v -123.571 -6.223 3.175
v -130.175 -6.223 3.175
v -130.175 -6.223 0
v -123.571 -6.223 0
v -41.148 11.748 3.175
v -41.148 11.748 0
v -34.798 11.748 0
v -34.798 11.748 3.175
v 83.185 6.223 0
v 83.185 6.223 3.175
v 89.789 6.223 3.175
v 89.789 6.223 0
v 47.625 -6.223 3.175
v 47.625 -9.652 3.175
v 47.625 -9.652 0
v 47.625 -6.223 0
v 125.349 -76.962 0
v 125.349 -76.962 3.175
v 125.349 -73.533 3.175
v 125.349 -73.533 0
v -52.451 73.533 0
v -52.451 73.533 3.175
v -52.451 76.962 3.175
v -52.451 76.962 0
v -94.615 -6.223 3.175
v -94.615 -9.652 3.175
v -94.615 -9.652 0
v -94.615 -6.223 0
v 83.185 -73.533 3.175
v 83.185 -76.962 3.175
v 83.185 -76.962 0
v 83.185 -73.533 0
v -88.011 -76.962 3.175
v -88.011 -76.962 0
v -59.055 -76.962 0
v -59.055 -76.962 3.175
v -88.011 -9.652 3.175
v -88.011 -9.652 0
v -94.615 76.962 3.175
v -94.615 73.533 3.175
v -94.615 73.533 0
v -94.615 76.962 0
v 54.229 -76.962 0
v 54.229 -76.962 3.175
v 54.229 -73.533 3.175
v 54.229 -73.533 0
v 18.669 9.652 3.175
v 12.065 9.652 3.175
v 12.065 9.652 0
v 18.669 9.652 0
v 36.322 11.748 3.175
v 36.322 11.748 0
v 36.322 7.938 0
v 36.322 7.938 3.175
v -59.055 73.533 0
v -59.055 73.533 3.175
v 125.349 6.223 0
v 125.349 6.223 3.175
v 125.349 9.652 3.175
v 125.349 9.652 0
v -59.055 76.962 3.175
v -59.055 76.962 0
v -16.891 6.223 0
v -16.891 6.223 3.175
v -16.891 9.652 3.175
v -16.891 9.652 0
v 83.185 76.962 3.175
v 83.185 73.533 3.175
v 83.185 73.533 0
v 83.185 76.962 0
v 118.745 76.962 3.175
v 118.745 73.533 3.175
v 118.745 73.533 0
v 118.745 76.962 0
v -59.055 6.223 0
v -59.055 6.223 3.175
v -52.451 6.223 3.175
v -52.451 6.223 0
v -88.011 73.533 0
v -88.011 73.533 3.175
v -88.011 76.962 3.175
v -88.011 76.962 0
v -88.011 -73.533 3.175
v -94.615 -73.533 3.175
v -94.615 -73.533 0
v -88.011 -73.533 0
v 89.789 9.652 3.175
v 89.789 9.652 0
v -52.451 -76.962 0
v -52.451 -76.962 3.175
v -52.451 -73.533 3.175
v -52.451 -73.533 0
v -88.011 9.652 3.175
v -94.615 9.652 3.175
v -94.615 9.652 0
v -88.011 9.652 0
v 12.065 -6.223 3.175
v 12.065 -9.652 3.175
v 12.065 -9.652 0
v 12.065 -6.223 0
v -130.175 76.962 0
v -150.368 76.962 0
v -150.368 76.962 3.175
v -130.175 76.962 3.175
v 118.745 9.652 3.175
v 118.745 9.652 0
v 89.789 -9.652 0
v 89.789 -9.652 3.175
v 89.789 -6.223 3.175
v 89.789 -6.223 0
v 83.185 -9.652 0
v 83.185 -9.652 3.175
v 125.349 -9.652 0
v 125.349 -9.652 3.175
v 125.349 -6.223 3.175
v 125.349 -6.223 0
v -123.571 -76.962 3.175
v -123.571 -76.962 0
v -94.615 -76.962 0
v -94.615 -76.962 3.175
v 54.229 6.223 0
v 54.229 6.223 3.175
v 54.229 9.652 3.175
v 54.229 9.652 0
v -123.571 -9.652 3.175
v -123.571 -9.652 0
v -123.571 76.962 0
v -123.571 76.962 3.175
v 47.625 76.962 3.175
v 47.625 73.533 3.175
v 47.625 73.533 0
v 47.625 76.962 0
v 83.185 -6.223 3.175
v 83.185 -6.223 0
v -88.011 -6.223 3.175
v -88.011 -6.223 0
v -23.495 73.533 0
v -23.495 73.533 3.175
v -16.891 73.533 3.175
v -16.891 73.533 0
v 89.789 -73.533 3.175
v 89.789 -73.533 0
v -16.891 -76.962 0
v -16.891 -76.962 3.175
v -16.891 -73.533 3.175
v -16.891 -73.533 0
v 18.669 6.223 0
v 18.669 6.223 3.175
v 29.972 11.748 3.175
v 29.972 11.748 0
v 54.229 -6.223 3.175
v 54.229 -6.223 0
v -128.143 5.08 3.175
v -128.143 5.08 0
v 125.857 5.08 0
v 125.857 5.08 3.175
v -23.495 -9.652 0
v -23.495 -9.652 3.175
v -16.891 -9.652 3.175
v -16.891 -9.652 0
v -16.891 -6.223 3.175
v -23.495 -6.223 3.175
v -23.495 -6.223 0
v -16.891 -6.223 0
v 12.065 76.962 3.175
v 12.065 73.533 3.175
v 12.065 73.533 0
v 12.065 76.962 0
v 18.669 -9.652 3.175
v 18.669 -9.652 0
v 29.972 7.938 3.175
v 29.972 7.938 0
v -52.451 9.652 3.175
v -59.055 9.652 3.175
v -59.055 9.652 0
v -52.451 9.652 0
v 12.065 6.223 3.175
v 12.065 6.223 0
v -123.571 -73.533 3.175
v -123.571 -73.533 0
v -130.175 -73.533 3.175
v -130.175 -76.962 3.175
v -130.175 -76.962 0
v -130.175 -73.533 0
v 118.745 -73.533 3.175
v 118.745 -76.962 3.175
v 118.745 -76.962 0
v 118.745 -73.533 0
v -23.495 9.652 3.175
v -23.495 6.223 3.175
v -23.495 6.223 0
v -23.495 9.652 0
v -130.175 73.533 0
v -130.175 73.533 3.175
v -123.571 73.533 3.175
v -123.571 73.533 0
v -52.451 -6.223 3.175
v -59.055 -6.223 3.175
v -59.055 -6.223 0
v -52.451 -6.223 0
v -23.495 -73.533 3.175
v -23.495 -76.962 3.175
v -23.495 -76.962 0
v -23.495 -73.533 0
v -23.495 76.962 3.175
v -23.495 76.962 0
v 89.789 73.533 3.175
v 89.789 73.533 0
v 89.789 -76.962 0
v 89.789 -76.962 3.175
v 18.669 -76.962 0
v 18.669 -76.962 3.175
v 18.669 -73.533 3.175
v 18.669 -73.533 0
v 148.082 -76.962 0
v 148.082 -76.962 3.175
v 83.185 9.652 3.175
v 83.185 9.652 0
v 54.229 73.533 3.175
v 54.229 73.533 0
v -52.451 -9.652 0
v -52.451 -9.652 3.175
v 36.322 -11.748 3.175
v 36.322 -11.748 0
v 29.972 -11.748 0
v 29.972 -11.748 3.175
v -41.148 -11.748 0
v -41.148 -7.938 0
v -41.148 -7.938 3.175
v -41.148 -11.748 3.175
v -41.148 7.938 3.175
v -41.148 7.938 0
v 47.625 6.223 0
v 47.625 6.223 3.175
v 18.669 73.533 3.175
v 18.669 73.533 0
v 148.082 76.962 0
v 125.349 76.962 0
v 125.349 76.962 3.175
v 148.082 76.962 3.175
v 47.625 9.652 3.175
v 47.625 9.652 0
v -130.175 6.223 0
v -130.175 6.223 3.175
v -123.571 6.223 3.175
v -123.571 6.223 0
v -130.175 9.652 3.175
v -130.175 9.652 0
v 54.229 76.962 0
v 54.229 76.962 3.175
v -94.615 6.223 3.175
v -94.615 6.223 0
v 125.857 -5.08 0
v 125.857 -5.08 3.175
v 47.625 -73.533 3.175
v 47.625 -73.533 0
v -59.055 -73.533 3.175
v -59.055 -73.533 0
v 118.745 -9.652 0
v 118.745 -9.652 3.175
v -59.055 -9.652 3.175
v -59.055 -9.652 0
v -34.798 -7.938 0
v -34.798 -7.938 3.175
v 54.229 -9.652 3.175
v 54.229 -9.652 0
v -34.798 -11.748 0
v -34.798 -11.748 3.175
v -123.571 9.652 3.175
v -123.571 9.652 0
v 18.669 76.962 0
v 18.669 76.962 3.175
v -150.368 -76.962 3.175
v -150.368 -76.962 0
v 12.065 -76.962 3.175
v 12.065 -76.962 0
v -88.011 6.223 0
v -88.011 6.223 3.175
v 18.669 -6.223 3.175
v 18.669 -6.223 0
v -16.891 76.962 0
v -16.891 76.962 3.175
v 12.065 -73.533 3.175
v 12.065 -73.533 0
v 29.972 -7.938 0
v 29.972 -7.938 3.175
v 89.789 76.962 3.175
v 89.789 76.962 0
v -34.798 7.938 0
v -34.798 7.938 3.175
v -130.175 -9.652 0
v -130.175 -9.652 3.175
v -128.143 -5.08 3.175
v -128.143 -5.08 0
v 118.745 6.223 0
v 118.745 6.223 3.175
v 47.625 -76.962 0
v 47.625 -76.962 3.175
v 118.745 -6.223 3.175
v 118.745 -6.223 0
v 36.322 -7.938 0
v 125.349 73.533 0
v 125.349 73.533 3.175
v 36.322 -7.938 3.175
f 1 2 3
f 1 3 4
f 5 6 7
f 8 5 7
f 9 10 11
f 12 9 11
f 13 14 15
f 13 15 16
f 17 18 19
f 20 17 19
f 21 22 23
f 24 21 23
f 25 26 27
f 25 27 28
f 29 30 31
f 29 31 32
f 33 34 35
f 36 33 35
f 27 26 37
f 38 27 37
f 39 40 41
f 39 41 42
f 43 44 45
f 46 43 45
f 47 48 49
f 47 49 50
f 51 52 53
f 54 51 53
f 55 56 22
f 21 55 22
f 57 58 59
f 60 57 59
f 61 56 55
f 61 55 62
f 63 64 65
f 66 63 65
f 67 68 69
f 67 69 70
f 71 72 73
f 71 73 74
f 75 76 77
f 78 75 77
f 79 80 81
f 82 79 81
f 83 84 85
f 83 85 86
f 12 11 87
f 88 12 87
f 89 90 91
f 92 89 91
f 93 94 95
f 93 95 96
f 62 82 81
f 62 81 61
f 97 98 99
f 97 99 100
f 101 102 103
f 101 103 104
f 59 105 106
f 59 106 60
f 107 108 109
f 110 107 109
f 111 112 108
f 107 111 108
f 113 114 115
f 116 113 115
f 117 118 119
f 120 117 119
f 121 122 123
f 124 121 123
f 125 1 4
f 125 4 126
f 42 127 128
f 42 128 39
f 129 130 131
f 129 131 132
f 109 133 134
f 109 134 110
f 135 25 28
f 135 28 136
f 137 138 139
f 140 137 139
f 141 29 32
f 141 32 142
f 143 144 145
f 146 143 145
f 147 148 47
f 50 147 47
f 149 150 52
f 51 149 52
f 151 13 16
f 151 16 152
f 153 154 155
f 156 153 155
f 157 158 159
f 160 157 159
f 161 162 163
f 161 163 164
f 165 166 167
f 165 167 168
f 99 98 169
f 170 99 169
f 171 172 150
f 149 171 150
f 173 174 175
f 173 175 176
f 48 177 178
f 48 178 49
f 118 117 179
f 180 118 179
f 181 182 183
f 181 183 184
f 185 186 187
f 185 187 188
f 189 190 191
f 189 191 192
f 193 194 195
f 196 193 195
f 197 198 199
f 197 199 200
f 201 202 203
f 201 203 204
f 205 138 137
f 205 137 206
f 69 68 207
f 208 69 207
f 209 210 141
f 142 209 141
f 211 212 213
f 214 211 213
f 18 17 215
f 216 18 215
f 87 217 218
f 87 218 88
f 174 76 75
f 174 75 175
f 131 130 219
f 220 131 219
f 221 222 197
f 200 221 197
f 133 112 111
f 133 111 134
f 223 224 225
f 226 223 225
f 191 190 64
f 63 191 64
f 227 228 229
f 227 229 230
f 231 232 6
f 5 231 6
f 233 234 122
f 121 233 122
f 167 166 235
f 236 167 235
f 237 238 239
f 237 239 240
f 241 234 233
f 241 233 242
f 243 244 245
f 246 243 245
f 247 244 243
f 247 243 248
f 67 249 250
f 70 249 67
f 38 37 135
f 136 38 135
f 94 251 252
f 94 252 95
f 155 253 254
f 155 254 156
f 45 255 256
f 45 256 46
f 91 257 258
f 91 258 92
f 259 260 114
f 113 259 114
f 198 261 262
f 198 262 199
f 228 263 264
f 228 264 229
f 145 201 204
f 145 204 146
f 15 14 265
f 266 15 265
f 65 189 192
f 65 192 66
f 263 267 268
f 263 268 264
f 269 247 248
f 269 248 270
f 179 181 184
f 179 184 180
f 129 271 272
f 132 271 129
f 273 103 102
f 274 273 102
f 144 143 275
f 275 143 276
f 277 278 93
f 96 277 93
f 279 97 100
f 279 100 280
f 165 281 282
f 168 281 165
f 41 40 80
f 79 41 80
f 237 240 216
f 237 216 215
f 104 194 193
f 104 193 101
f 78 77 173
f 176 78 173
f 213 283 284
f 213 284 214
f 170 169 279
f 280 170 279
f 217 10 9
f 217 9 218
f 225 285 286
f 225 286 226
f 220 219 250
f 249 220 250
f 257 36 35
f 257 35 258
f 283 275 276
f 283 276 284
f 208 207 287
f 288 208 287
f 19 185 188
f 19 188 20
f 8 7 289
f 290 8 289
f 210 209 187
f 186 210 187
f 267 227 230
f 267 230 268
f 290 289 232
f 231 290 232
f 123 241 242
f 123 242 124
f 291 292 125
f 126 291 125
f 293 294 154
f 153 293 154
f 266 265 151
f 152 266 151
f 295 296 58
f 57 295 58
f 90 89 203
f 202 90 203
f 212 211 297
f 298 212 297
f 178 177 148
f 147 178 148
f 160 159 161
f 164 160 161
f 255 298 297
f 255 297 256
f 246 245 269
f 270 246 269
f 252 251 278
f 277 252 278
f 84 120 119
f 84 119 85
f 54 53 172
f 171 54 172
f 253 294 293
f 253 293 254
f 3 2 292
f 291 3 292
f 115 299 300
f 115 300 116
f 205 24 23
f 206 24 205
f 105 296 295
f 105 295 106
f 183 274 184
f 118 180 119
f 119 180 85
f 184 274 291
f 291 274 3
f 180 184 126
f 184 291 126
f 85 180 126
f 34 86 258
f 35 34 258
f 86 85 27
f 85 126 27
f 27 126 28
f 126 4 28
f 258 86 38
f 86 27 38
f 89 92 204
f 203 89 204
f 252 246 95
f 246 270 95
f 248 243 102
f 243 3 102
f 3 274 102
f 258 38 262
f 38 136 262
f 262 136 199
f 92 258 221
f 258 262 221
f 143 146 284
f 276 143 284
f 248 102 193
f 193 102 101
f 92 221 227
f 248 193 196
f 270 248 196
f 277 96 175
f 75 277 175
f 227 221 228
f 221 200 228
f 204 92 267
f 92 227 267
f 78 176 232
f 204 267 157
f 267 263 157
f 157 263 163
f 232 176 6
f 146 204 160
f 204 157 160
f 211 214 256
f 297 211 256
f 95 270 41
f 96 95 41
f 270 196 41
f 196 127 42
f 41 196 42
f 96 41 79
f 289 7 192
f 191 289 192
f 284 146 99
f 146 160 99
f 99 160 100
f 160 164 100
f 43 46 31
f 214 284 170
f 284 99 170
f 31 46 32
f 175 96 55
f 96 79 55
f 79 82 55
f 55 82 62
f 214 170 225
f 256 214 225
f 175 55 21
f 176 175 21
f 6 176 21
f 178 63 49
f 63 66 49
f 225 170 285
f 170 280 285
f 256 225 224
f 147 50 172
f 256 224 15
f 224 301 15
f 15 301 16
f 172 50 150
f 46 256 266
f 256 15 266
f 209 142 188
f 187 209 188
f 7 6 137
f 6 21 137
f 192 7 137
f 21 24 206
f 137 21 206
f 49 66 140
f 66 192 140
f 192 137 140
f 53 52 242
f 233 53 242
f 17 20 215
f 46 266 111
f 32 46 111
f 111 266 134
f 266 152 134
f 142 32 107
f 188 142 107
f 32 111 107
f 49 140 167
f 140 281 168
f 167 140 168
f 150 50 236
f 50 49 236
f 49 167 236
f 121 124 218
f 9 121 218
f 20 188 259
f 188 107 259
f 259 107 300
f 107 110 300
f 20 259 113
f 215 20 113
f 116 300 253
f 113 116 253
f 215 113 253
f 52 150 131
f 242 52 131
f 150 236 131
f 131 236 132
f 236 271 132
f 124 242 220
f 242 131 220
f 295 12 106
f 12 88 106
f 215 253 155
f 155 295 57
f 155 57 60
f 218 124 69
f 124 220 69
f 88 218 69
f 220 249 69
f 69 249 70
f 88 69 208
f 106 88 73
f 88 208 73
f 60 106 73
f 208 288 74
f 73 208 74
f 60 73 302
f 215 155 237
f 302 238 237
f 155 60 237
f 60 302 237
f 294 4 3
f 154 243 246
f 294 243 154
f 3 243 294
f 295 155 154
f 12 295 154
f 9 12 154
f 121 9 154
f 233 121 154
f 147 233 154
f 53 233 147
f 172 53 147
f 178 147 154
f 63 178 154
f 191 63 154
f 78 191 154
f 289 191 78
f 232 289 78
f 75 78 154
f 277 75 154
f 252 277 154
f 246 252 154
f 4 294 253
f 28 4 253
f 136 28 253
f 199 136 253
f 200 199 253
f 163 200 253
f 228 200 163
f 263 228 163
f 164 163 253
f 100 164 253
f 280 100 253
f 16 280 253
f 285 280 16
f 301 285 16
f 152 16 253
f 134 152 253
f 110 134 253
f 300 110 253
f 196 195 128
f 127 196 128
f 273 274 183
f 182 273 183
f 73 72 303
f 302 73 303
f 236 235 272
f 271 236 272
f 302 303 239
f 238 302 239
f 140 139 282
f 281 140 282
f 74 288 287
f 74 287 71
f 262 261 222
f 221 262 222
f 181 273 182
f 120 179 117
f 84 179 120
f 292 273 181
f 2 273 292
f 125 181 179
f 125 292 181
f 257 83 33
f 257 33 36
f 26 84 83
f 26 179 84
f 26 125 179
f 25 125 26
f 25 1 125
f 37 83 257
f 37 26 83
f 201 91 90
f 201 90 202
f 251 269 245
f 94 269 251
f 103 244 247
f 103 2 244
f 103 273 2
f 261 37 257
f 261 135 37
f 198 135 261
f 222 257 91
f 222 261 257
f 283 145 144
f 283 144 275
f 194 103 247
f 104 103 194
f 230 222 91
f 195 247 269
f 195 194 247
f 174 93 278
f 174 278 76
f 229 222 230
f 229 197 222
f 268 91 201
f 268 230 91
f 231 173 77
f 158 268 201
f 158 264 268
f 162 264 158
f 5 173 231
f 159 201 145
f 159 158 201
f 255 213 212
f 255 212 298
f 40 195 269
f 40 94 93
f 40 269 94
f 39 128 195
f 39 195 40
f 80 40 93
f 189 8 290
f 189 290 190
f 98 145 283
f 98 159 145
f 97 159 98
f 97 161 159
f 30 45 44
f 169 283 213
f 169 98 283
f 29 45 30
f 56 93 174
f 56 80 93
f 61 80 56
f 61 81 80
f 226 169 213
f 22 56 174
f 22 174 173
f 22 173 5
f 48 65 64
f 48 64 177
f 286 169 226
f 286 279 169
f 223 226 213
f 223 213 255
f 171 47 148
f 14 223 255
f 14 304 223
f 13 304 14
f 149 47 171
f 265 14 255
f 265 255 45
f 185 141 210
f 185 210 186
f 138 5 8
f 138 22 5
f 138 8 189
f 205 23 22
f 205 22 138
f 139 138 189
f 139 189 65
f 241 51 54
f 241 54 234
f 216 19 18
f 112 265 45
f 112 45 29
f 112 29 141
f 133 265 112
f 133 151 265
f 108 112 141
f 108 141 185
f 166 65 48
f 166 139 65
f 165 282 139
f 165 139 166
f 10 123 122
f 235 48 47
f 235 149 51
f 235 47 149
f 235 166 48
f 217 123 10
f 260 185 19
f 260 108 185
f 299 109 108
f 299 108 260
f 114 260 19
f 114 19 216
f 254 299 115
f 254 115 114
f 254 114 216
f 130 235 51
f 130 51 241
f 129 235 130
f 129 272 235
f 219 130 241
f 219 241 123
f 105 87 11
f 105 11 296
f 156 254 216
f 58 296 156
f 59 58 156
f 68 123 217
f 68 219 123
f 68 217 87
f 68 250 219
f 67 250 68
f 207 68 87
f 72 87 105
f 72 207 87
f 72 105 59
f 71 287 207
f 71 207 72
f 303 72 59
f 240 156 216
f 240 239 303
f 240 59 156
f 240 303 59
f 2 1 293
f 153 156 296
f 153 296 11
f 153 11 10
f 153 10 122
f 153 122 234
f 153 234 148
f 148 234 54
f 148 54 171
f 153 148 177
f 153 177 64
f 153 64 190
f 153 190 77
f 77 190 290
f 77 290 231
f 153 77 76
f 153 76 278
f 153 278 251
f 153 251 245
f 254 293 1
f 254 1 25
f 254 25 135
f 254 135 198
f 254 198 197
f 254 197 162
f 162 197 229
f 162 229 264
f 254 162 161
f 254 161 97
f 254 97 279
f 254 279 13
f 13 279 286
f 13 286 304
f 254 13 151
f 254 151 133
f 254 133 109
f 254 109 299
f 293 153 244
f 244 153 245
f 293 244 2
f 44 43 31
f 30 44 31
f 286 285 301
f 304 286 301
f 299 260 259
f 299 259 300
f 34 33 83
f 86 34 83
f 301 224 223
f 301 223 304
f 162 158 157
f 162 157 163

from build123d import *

# Parameters (mm, degrees)
SKETCH4_W                = 298.45
SKETCH4_H                = 38.1
SKETCH4_W_2              = 254
SKETCH4_H_2              = 10.16
BOSS_EXTRUDE1_DEPTH      = 3.175
SKETCH5_W                = 6.604
SKETCH5_H                = 3.429
CUT_EXTRUDE1_DEPTH       = 152.603161408
SKETCH7_W                = 298.45
SKETCH7_H                = 3.175
BOSS_EXTRUDE2_DEPTH      = 57.912
LPATTERN3_COUNT          = 2
LPATTERN3_PITCH          = 67.31
LPATTERN3_COUNT_DIR2     = 8
LPATTERN3_PITCH_DIR2     = 35.56
CUT_EXTRUDE2_DEPTH       = 169.94900264
LPATTERN2_COUNT          = 2
LPATTERN2_PITCH          = 71.12
MIRROR1_COPY_1_SKETCH_W  = 6.604
MIRROR1_COPY_1_SKETCH_H  = 3.429
MIRROR1_COPY_1_DEPTH     = 152.603161408
MIRROR1_COPY_2_SKETCH_W  = 6.604
MIRROR1_COPY_2_SKETCH_H  = 3.429
MIRROR1_COPY_2_DEPTH     = 152.603161408
MIRROR1_COPY_3_SKETCH_W  = 6.604
MIRROR1_COPY_3_SKETCH_H  = 3.429
MIRROR1_COPY_3_DEPTH     = 152.603161408
MIRROR1_COPY_4_SKETCH_W  = 6.604
MIRROR1_COPY_4_SKETCH_H  = 3.429
MIRROR1_COPY_4_DEPTH     = 152.603161408
MIRROR1_COPY_5_SKETCH_W  = 6.604
MIRROR1_COPY_5_SKETCH_H  = 3.429
MIRROR1_COPY_5_DEPTH     = 152.603161408
MIRROR1_COPY_6_SKETCH_W  = 6.604
MIRROR1_COPY_6_SKETCH_H  = 3.429
MIRROR1_COPY_6_DEPTH     = 152.603161408
MIRROR1_COPY_7_SKETCH_W  = 6.604
MIRROR1_COPY_7_SKETCH_H  = 3.429
MIRROR1_COPY_7_DEPTH     = 152.603161408
MIRROR1_COPY_8_SKETCH_W  = 6.604
MIRROR1_COPY_8_SKETCH_H  = 3.429
MIRROR1_COPY_8_DEPTH     = 152.603161408
MIRROR1_COPY_9_SKETCH_W  = 6.604
MIRROR1_COPY_9_SKETCH_H  = 3.429
MIRROR1_COPY_9_DEPTH     = 152.603161408
MIRROR1_COPY_10_SKETCH_W = 6.604
MIRROR1_COPY_10_SKETCH_H = 3.429
MIRROR1_COPY_10_DEPTH    = 152.603161408
MIRROR1_COPY_11_SKETCH_W = 6.604
MIRROR1_COPY_11_SKETCH_H = 3.429
MIRROR1_COPY_11_DEPTH    = 152.603161408
MIRROR1_COPY_12_SKETCH_W = 6.604
MIRROR1_COPY_12_SKETCH_H = 3.429
MIRROR1_COPY_12_DEPTH    = 152.603161408
MIRROR1_COPY_13_SKETCH_W = 6.604
MIRROR1_COPY_13_SKETCH_H = 3.429
MIRROR1_COPY_13_DEPTH    = 152.603161408
MIRROR1_COPY_14_SKETCH_W = 6.604
MIRROR1_COPY_14_SKETCH_H = 3.429
MIRROR1_COPY_14_DEPTH    = 152.603161408
MIRROR1_COPY_15_SKETCH_W = 6.604
MIRROR1_COPY_15_SKETCH_H = 3.429
MIRROR1_COPY_15_DEPTH    = 152.603161408
MIRROR1_COPY_16_DEPTH    = 169.94900264


with BuildPart() as part:
    # Sketch4 → Boss-Extrude1 (new body)
    with BuildSketch(Plane.XY):
        with Locations((-1.143, 0)):
            Rectangle(SKETCH4_W, SKETCH4_H)
        with Locations((-1.143, 0)):
            Rectangle(SKETCH4_W_2, SKETCH4_H_2, mode=Mode.SUBTRACT)
    extrude(amount=BOSS_EXTRUDE1_DEPTH)

    # Sketch5 → Cut-Extrude1 (cut, through all)
    with BuildSketch(Plane.XY.offset(3.175)):
        with Locations((-126.873, 7.9375)):
            Rectangle(SKETCH5_W, SKETCH5_H)
    cut_extrude1 = extrude(amount=-CUT_EXTRUDE1_DEPTH, mode=Mode.SUBTRACT)

    # Sketch7 → Boss-Extrude2 (add)
    with BuildSketch(Plane(origin=(0, 19.05, 0), x_dir=(1, 0, 0), z_dir=(0, 1, 0))):
        with Locations((-1.143, -1.5875)):
            Rectangle(SKETCH7_W, SKETCH7_H)
    boss_extrude2 = extrude(amount=BOSS_EXTRUDE2_DEPTH)

    # LPattern3: Cut-Extrude1 2 × 8
    with Locations(*[(j * LPATTERN3_PITCH_DIR2, i * LPATTERN3_PITCH, 0) for i in range(LPATTERN3_COUNT) for j in range(LPATTERN3_COUNT_DIR2) if (i, j) != (0, 0)]):
        add(cut_extrude1, mode=Mode.SUBTRACT)

    # Sketch6 → Cut-Extrude2 (cut, through all)
    with BuildSketch(Plane(origin=(0, 0, 0), x_dir=(-1, 0, 0), z_dir=(0, 0, -1))):
        Polygon((37.973, 7.9375), (41.148, 7.9375), (41.148, 11.7475), (37.973, 11.7475), (34.798, 11.7475), (34.798, 7.9375), align=None)
    cut_extrude2 = extrude(amount=-CUT_EXTRUDE2_DEPTH, mode=Mode.SUBTRACT)

    # LPattern2: Cut-Extrude2 ×2
    with Locations(*[(i * LPATTERN2_PITCH, 0, 0) for i in range(1, LPATTERN2_COUNT)]):
        add(cut_extrude2, mode=Mode.SUBTRACT)

    # Mirror1: Cut-Extrude1, Boss-Extrude2, Cut-Extrude2 across plane
    add(cut_extrude1.mirror(Plane.ZX), mode=Mode.SUBTRACT)
    add(boss_extrude2.mirror(Plane.ZX))
    add(cut_extrude2.mirror(Plane.ZX), mode=Mode.SUBTRACT)

    # Mirror1 copy 1 sketch → Mirror1 copy 1 (cut, through all)
    with BuildSketch(Plane(origin=(35.56, 0, 3.175), x_dir=(1, 0, 0), z_dir=(0, 0, 1))):
        with Locations((-126.873, -7.9375)):
            Rectangle(MIRROR1_COPY_1_SKETCH_W, MIRROR1_COPY_1_SKETCH_H)
    extrude(amount=-MIRROR1_COPY_1_DEPTH, mode=Mode.SUBTRACT)

    # Mirror1 copy 2 sketch → Mirror1 copy 2 (cut, through all)
    with BuildSketch(Plane(origin=(71.12, 0, 3.175), x_dir=(1, 0, 0), z_dir=(0, 0, 1))):
        with Locations((-126.873, -7.9375)):
            Rectangle(MIRROR1_COPY_2_SKETCH_W, MIRROR1_COPY_2_SKETCH_H)
    extrude(amount=-MIRROR1_COPY_2_DEPTH, mode=Mode.SUBTRACT)

    # Mirror1 copy 3 sketch → Mirror1 copy 3 (cut, through all)
    with BuildSketch(Plane(origin=(106.68, 0, 3.175), x_dir=(1, 0, 0), z_dir=(0, 0, 1))):
        with Locations((-126.873, -7.9375)):
            Rectangle(MIRROR1_COPY_3_SKETCH_W, MIRROR1_COPY_3_SKETCH_H)
    extrude(amount=-MIRROR1_COPY_3_DEPTH, mode=Mode.SUBTRACT)

    # Mirror1 copy 4 sketch → Mirror1 copy 4 (cut, through all)
    with BuildSketch(Plane(origin=(142.24, 0, 3.175), x_dir=(1, 0, 0), z_dir=(0, 0, 1))):
        with Locations((-126.873, -7.9375)):
            Rectangle(MIRROR1_COPY_4_SKETCH_W, MIRROR1_COPY_4_SKETCH_H)
    extrude(amount=-MIRROR1_COPY_4_DEPTH, mode=Mode.SUBTRACT)

    # Mirror1 copy 5 sketch → Mirror1 copy 5 (cut, through all)
    with BuildSketch(Plane(origin=(177.8, 0, 3.175), x_dir=(1, 0, 0), z_dir=(0, 0, 1))):
        with Locations((-126.873, -7.9375)):
            Rectangle(MIRROR1_COPY_5_SKETCH_W, MIRROR1_COPY_5_SKETCH_H)
    extrude(amount=-MIRROR1_COPY_5_DEPTH, mode=Mode.SUBTRACT)

    # Mirror1 copy 6 sketch → Mirror1 copy 6 (cut, through all)
    with BuildSketch(Plane(origin=(213.36, 0, 3.175), x_dir=(1, 0, 0), z_dir=(0, 0, 1))):
        with Locations((-126.873, -7.9375)):
            Rectangle(MIRROR1_COPY_6_SKETCH_W, MIRROR1_COPY_6_SKETCH_H)
    extrude(amount=-MIRROR1_COPY_6_DEPTH, mode=Mode.SUBTRACT)

    # Mirror1 copy 7 sketch → Mirror1 copy 7 (cut, through all)
    with BuildSketch(Plane(origin=(248.92, 0, 3.175), x_dir=(1, 0, 0), z_dir=(0, 0, 1))):
        with Locations((-126.873, -7.9375)):
            Rectangle(MIRROR1_COPY_7_SKETCH_W, MIRROR1_COPY_7_SKETCH_H)
    extrude(amount=-MIRROR1_COPY_7_DEPTH, mode=Mode.SUBTRACT)

    # Mirror1 copy 8 sketch → Mirror1 copy 8 (cut, through all)
    with BuildSketch(Plane(origin=(0, -67.31, 3.175), x_dir=(1, 0, 0), z_dir=(0, 0, 1))):
        with Locations((-126.873, -7.9375)):
            Rectangle(MIRROR1_COPY_8_SKETCH_W, MIRROR1_COPY_8_SKETCH_H)
    extrude(amount=-MIRROR1_COPY_8_DEPTH, mode=Mode.SUBTRACT)

    # Mirror1 copy 9 sketch → Mirror1 copy 9 (cut, through all)
    with BuildSketch(Plane(origin=(35.56, -67.31, 3.175), x_dir=(1, 0, 0), z_dir=(0, 0, 1))):
        with Locations((-126.873, -7.9375)):
            Rectangle(MIRROR1_COPY_9_SKETCH_W, MIRROR1_COPY_9_SKETCH_H)
    extrude(amount=-MIRROR1_COPY_9_DEPTH, mode=Mode.SUBTRACT)

    # Mirror1 copy 10 sketch → Mirror1 copy 10 (cut, through all)
    with BuildSketch(Plane(origin=(71.12, -67.31, 3.175), x_dir=(1, 0, 0), z_dir=(0, 0, 1))):
        with Locations((-126.873, -7.9375)):
            Rectangle(MIRROR1_COPY_10_SKETCH_W, MIRROR1_COPY_10_SKETCH_H)
    extrude(amount=-MIRROR1_COPY_10_DEPTH, mode=Mode.SUBTRACT)

    # Mirror1 copy 11 sketch → Mirror1 copy 11 (cut, through all)
    with BuildSketch(Plane(origin=(106.68, -67.31, 3.175), x_dir=(1, 0, 0), z_dir=(0, 0, 1))):
        with Locations((-126.873, -7.9375)):
            Rectangle(MIRROR1_COPY_11_SKETCH_W, MIRROR1_COPY_11_SKETCH_H)
    extrude(amount=-MIRROR1_COPY_11_DEPTH, mode=Mode.SUBTRACT)

    # Mirror1 copy 12 sketch → Mirror1 copy 12 (cut, through all)
    with BuildSketch(Plane(origin=(142.24, -67.31, 3.175), x_dir=(1, 0, 0), z_dir=(0, 0, 1))):
        with Locations((-126.873, -7.9375)):
            Rectangle(MIRROR1_COPY_12_SKETCH_W, MIRROR1_COPY_12_SKETCH_H)
    extrude(amount=-MIRROR1_COPY_12_DEPTH, mode=Mode.SUBTRACT)

    # Mirror1 copy 13 sketch → Mirror1 copy 13 (cut, through all)
    with BuildSketch(Plane(origin=(177.8, -67.31, 3.175), x_dir=(1, 0, 0), z_dir=(0, 0, 1))):
        with Locations((-126.873, -7.9375)):
            Rectangle(MIRROR1_COPY_13_SKETCH_W, MIRROR1_COPY_13_SKETCH_H)
    extrude(amount=-MIRROR1_COPY_13_DEPTH, mode=Mode.SUBTRACT)

    # Mirror1 copy 14 sketch → Mirror1 copy 14 (cut, through all)
    with BuildSketch(Plane(origin=(213.36, -67.31, 3.175), x_dir=(1, 0, 0), z_dir=(0, 0, 1))):
        with Locations((-126.873, -7.9375)):
            Rectangle(MIRROR1_COPY_14_SKETCH_W, MIRROR1_COPY_14_SKETCH_H)
    extrude(amount=-MIRROR1_COPY_14_DEPTH, mode=Mode.SUBTRACT)

    # Mirror1 copy 15 sketch → Mirror1 copy 15 (cut, through all)
    with BuildSketch(Plane(origin=(248.92, -67.31, 3.175), x_dir=(1, 0, 0), z_dir=(0, 0, 1))):
        with Locations((-126.873, -7.9375)):
            Rectangle(MIRROR1_COPY_15_SKETCH_W, MIRROR1_COPY_15_SKETCH_H)
    extrude(amount=-MIRROR1_COPY_15_DEPTH, mode=Mode.SUBTRACT)

    # Mirror1 copy 16 sketch → Mirror1 copy 16 (cut, through all)
    with BuildSketch(Plane(origin=(71.12, 0, 0), x_dir=(-1, 0, 0), z_dir=(0, 0, -1))):
        Polygon((37.973, -7.9375), (41.148, -7.9375), (41.148, -11.7475), (37.973, -11.7475), (34.798, -11.7475), (34.798, -7.9375), align=None)
    extrude(amount=-MIRROR1_COPY_16_DEPTH, mode=Mode.SUBTRACT)


solid = part.part
